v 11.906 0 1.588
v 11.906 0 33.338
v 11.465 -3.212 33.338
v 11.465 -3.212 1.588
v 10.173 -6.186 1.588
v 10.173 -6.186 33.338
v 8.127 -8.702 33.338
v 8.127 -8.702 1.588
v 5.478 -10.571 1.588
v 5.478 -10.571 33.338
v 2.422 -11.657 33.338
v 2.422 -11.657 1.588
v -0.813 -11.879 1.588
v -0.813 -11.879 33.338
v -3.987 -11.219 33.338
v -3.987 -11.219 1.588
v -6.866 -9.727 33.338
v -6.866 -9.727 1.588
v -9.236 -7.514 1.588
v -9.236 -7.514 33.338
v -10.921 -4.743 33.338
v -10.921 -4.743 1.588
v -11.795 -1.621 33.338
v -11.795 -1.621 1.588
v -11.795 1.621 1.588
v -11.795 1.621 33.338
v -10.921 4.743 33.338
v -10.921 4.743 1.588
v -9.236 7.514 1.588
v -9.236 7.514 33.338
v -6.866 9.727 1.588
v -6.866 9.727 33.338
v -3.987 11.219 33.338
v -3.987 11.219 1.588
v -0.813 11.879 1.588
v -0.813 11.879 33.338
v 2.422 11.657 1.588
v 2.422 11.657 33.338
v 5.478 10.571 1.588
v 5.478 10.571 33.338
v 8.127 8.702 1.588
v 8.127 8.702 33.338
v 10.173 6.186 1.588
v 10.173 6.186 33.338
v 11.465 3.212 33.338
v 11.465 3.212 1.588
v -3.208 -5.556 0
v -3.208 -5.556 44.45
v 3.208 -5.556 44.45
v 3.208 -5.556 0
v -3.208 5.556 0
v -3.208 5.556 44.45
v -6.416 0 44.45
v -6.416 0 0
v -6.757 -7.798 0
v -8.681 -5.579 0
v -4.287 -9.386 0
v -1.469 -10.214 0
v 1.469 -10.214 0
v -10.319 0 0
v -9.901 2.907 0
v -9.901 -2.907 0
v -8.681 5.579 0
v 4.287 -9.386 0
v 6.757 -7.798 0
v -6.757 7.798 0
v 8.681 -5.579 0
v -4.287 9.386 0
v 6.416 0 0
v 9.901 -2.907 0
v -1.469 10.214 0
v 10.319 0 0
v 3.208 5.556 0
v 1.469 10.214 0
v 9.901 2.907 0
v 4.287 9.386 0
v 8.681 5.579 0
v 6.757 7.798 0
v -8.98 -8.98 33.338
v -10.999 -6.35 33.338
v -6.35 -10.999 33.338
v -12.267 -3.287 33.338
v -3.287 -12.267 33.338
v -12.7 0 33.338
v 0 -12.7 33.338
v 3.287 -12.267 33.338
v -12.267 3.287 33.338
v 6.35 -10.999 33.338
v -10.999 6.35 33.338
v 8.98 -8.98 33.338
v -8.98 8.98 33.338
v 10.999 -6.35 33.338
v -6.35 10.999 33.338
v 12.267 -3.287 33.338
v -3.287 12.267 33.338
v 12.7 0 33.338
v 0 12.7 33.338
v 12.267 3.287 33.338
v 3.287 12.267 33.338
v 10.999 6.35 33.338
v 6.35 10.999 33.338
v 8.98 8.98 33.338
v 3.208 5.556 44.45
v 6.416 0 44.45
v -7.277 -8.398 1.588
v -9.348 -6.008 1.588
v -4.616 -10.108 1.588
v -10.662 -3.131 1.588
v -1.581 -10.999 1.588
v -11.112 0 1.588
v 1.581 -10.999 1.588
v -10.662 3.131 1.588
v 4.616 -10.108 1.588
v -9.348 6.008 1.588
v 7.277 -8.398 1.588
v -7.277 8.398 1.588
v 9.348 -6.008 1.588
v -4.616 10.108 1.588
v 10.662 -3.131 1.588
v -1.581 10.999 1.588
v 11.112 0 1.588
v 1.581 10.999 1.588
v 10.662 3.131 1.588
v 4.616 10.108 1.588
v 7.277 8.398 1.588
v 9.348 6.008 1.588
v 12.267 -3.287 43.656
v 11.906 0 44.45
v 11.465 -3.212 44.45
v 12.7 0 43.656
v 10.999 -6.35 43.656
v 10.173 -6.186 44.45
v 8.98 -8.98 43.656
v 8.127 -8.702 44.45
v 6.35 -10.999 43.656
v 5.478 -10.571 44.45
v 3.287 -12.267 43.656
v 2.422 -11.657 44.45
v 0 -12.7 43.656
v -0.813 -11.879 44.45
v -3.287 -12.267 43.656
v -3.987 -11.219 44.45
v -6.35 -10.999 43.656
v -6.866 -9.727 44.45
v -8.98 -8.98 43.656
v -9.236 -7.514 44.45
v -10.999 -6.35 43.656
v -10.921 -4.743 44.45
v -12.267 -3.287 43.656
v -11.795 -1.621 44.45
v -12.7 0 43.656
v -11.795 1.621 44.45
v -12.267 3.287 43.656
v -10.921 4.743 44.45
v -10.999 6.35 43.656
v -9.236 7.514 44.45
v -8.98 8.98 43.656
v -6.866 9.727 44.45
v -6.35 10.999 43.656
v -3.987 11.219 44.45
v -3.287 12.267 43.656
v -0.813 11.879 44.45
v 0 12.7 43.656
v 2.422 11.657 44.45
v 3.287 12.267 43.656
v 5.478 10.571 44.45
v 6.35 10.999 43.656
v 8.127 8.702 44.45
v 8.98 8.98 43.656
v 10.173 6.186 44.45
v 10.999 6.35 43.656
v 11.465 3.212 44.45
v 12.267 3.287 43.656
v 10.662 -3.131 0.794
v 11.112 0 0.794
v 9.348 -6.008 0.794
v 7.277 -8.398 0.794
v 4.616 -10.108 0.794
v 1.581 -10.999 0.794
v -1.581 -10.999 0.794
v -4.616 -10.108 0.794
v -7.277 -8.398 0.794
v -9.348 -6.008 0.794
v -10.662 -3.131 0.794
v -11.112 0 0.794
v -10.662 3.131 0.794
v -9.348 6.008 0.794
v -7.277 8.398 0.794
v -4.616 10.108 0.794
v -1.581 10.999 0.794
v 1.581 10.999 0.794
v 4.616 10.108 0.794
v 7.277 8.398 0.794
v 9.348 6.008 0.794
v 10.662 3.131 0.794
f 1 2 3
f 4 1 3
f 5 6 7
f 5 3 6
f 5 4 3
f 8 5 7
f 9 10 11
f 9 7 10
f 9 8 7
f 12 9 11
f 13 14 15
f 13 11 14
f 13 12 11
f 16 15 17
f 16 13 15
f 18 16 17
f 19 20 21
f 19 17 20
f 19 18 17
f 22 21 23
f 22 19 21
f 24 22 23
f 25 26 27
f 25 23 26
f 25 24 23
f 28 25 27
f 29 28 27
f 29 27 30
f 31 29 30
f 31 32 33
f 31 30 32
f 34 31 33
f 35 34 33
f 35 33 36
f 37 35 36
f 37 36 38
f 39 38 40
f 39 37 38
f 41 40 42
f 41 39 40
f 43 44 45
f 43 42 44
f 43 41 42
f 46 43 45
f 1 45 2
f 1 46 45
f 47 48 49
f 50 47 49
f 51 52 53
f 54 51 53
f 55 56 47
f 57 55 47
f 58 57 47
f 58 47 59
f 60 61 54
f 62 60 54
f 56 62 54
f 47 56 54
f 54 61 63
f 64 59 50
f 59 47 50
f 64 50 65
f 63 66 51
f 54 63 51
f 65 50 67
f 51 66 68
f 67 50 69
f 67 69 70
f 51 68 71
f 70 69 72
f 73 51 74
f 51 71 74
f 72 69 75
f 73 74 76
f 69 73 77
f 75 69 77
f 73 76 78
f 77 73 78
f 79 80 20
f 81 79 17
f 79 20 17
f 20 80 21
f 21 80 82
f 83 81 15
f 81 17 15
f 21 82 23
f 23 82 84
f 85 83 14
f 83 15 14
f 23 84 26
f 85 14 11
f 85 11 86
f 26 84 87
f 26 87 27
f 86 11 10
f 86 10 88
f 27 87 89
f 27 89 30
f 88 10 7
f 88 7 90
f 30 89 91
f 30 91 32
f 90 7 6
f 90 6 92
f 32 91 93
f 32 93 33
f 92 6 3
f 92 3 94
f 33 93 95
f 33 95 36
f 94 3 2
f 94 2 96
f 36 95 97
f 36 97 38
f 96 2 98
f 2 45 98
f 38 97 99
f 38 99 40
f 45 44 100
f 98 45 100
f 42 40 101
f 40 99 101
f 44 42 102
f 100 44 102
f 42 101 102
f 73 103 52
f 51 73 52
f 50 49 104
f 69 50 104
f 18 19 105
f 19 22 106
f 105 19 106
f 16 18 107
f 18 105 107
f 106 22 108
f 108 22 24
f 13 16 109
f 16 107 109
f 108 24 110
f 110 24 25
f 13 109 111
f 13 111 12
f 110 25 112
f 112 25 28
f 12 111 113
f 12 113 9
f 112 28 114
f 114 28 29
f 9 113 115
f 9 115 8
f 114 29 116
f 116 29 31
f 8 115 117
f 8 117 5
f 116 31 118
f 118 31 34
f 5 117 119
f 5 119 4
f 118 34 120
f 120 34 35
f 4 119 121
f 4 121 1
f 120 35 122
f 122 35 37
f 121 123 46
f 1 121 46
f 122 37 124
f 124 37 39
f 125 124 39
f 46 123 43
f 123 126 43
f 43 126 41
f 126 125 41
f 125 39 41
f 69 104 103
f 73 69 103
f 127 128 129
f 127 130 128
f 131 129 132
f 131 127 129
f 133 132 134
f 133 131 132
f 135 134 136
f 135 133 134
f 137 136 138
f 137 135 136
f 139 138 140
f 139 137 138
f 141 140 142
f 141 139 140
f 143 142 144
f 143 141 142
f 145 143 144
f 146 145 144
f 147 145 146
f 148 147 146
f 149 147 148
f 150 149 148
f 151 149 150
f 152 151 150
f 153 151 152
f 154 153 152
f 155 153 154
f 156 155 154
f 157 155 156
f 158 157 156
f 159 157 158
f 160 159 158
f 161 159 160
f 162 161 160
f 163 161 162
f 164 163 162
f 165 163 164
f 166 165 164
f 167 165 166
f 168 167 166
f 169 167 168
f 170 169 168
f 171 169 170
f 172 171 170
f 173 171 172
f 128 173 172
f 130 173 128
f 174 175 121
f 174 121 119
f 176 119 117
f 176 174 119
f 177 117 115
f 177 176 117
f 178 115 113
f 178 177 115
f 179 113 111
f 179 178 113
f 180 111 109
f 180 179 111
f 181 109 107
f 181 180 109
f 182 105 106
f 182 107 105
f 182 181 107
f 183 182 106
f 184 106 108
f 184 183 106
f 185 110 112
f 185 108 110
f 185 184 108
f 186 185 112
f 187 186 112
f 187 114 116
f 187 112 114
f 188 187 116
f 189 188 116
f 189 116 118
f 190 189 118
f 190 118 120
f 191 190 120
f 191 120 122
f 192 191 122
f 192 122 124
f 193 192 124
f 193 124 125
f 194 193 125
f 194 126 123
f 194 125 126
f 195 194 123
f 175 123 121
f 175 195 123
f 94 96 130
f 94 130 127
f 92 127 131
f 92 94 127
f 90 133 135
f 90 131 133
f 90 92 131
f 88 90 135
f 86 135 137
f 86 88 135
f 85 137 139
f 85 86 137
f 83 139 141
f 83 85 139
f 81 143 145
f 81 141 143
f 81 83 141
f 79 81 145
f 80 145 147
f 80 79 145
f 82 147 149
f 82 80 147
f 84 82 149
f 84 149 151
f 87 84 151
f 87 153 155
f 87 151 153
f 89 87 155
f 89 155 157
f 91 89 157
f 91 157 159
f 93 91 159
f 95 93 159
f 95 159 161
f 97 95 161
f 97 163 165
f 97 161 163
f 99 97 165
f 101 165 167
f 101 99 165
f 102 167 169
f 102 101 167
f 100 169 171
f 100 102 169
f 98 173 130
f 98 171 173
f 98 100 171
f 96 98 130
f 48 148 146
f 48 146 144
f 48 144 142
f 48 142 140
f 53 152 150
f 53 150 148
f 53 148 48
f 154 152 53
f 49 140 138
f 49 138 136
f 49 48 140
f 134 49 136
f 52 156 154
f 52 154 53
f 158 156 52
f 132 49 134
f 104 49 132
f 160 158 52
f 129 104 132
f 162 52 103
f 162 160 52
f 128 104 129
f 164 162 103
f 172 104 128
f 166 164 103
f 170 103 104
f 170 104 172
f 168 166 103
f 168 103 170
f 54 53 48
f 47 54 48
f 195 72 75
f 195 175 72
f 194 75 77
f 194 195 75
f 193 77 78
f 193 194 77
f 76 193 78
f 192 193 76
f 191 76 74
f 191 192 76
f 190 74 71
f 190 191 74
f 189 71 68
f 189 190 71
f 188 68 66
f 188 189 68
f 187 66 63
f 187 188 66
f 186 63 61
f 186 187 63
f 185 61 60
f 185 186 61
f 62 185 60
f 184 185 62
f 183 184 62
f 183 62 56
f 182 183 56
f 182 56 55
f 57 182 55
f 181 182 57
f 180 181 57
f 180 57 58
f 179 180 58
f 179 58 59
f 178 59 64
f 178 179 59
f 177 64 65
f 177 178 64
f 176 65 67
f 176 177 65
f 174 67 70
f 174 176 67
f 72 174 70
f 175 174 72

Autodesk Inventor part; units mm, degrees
ref_plane "YZ Plane" through (0, 0, 0) normal (1, 0, 0) x (0, 1, 0)
ref_plane "XZ Plane" through (0, 0, 0) normal (0, 1, 0) x (-1, 0, 0)
ref_plane "XY Plane" through (0, 0, 0) normal (0, 0, 1) x (1, 0, 0)
sketch "Sketch1" plane through (0, 0, 0) normal (0, 0, 1) x (1, 0, 0)
  circle A0 centre (0, 0) radius 11.1125
  dimension "d0" = 22.225
extrude "Bearing Offset" add sketch "Sketch1" along normal blind 1.5875
sketch "Sketch2" plane through (0, 0, 1.5875) normal (0, 0, 1) x (1, 0, 0)
  circle A0 centre (0, 0) radius 11.1125 projected
  circle A1 centre (0, 0) radius 11.9063
  dimension "d3" = 23.8125
extrude "Colson Hub (Press Fit)" add sketch "Sketch2" along normal blind 31.75 contours A0 | A1
sketch "Sketch3" plane through (0, 0, 33.3375) normal (0, 0, 1) x (1, 0, 0)
  circle A0 centre (0, 0) radius 11.9063 projected
  circle A1 centre (0, 0) radius 12.7
  dimension "d6" = 25.4
extrude "Colson Retension" add sketch "Sketch3" along normal blind 11.1125 contours A0 | A1
sketch "Sketch4" plane through (0, 0, 0) normal (0, 0, -1) x (-1, 0, 0)
  circle A0 centre (0, 0) radius 11.1125 projected
  line L0 (3.2079, 5.5563) -> (6.4158, 0)
  line L1 (6.4158, 0) -> (3.2079, -5.5563)
  line L2 (3.2079, -5.5563) -> (-3.2079, -5.5563)
  line L3 (-3.2079, -5.5563) -> (-6.4158, 0)
  line L4 (-6.4158, 0) -> (-3.2079, 5.5563)
  line L5 (-3.2079, 5.5563) -> (3.2079, 5.5563)
  dimension "d9" = 11.1125
extrude "7/16\" Hex" cut sketch "Sketch4" against normal through all contours L0 L1 L2 L3 L4 L5
chamfer "End Chamfers" distance 0.7937 angle 45 2 edges at (-11.1125, 0, 0) (-12.7, 0, 44.45)
properties part number "Colson Hub" material "Aluminum 6061"
